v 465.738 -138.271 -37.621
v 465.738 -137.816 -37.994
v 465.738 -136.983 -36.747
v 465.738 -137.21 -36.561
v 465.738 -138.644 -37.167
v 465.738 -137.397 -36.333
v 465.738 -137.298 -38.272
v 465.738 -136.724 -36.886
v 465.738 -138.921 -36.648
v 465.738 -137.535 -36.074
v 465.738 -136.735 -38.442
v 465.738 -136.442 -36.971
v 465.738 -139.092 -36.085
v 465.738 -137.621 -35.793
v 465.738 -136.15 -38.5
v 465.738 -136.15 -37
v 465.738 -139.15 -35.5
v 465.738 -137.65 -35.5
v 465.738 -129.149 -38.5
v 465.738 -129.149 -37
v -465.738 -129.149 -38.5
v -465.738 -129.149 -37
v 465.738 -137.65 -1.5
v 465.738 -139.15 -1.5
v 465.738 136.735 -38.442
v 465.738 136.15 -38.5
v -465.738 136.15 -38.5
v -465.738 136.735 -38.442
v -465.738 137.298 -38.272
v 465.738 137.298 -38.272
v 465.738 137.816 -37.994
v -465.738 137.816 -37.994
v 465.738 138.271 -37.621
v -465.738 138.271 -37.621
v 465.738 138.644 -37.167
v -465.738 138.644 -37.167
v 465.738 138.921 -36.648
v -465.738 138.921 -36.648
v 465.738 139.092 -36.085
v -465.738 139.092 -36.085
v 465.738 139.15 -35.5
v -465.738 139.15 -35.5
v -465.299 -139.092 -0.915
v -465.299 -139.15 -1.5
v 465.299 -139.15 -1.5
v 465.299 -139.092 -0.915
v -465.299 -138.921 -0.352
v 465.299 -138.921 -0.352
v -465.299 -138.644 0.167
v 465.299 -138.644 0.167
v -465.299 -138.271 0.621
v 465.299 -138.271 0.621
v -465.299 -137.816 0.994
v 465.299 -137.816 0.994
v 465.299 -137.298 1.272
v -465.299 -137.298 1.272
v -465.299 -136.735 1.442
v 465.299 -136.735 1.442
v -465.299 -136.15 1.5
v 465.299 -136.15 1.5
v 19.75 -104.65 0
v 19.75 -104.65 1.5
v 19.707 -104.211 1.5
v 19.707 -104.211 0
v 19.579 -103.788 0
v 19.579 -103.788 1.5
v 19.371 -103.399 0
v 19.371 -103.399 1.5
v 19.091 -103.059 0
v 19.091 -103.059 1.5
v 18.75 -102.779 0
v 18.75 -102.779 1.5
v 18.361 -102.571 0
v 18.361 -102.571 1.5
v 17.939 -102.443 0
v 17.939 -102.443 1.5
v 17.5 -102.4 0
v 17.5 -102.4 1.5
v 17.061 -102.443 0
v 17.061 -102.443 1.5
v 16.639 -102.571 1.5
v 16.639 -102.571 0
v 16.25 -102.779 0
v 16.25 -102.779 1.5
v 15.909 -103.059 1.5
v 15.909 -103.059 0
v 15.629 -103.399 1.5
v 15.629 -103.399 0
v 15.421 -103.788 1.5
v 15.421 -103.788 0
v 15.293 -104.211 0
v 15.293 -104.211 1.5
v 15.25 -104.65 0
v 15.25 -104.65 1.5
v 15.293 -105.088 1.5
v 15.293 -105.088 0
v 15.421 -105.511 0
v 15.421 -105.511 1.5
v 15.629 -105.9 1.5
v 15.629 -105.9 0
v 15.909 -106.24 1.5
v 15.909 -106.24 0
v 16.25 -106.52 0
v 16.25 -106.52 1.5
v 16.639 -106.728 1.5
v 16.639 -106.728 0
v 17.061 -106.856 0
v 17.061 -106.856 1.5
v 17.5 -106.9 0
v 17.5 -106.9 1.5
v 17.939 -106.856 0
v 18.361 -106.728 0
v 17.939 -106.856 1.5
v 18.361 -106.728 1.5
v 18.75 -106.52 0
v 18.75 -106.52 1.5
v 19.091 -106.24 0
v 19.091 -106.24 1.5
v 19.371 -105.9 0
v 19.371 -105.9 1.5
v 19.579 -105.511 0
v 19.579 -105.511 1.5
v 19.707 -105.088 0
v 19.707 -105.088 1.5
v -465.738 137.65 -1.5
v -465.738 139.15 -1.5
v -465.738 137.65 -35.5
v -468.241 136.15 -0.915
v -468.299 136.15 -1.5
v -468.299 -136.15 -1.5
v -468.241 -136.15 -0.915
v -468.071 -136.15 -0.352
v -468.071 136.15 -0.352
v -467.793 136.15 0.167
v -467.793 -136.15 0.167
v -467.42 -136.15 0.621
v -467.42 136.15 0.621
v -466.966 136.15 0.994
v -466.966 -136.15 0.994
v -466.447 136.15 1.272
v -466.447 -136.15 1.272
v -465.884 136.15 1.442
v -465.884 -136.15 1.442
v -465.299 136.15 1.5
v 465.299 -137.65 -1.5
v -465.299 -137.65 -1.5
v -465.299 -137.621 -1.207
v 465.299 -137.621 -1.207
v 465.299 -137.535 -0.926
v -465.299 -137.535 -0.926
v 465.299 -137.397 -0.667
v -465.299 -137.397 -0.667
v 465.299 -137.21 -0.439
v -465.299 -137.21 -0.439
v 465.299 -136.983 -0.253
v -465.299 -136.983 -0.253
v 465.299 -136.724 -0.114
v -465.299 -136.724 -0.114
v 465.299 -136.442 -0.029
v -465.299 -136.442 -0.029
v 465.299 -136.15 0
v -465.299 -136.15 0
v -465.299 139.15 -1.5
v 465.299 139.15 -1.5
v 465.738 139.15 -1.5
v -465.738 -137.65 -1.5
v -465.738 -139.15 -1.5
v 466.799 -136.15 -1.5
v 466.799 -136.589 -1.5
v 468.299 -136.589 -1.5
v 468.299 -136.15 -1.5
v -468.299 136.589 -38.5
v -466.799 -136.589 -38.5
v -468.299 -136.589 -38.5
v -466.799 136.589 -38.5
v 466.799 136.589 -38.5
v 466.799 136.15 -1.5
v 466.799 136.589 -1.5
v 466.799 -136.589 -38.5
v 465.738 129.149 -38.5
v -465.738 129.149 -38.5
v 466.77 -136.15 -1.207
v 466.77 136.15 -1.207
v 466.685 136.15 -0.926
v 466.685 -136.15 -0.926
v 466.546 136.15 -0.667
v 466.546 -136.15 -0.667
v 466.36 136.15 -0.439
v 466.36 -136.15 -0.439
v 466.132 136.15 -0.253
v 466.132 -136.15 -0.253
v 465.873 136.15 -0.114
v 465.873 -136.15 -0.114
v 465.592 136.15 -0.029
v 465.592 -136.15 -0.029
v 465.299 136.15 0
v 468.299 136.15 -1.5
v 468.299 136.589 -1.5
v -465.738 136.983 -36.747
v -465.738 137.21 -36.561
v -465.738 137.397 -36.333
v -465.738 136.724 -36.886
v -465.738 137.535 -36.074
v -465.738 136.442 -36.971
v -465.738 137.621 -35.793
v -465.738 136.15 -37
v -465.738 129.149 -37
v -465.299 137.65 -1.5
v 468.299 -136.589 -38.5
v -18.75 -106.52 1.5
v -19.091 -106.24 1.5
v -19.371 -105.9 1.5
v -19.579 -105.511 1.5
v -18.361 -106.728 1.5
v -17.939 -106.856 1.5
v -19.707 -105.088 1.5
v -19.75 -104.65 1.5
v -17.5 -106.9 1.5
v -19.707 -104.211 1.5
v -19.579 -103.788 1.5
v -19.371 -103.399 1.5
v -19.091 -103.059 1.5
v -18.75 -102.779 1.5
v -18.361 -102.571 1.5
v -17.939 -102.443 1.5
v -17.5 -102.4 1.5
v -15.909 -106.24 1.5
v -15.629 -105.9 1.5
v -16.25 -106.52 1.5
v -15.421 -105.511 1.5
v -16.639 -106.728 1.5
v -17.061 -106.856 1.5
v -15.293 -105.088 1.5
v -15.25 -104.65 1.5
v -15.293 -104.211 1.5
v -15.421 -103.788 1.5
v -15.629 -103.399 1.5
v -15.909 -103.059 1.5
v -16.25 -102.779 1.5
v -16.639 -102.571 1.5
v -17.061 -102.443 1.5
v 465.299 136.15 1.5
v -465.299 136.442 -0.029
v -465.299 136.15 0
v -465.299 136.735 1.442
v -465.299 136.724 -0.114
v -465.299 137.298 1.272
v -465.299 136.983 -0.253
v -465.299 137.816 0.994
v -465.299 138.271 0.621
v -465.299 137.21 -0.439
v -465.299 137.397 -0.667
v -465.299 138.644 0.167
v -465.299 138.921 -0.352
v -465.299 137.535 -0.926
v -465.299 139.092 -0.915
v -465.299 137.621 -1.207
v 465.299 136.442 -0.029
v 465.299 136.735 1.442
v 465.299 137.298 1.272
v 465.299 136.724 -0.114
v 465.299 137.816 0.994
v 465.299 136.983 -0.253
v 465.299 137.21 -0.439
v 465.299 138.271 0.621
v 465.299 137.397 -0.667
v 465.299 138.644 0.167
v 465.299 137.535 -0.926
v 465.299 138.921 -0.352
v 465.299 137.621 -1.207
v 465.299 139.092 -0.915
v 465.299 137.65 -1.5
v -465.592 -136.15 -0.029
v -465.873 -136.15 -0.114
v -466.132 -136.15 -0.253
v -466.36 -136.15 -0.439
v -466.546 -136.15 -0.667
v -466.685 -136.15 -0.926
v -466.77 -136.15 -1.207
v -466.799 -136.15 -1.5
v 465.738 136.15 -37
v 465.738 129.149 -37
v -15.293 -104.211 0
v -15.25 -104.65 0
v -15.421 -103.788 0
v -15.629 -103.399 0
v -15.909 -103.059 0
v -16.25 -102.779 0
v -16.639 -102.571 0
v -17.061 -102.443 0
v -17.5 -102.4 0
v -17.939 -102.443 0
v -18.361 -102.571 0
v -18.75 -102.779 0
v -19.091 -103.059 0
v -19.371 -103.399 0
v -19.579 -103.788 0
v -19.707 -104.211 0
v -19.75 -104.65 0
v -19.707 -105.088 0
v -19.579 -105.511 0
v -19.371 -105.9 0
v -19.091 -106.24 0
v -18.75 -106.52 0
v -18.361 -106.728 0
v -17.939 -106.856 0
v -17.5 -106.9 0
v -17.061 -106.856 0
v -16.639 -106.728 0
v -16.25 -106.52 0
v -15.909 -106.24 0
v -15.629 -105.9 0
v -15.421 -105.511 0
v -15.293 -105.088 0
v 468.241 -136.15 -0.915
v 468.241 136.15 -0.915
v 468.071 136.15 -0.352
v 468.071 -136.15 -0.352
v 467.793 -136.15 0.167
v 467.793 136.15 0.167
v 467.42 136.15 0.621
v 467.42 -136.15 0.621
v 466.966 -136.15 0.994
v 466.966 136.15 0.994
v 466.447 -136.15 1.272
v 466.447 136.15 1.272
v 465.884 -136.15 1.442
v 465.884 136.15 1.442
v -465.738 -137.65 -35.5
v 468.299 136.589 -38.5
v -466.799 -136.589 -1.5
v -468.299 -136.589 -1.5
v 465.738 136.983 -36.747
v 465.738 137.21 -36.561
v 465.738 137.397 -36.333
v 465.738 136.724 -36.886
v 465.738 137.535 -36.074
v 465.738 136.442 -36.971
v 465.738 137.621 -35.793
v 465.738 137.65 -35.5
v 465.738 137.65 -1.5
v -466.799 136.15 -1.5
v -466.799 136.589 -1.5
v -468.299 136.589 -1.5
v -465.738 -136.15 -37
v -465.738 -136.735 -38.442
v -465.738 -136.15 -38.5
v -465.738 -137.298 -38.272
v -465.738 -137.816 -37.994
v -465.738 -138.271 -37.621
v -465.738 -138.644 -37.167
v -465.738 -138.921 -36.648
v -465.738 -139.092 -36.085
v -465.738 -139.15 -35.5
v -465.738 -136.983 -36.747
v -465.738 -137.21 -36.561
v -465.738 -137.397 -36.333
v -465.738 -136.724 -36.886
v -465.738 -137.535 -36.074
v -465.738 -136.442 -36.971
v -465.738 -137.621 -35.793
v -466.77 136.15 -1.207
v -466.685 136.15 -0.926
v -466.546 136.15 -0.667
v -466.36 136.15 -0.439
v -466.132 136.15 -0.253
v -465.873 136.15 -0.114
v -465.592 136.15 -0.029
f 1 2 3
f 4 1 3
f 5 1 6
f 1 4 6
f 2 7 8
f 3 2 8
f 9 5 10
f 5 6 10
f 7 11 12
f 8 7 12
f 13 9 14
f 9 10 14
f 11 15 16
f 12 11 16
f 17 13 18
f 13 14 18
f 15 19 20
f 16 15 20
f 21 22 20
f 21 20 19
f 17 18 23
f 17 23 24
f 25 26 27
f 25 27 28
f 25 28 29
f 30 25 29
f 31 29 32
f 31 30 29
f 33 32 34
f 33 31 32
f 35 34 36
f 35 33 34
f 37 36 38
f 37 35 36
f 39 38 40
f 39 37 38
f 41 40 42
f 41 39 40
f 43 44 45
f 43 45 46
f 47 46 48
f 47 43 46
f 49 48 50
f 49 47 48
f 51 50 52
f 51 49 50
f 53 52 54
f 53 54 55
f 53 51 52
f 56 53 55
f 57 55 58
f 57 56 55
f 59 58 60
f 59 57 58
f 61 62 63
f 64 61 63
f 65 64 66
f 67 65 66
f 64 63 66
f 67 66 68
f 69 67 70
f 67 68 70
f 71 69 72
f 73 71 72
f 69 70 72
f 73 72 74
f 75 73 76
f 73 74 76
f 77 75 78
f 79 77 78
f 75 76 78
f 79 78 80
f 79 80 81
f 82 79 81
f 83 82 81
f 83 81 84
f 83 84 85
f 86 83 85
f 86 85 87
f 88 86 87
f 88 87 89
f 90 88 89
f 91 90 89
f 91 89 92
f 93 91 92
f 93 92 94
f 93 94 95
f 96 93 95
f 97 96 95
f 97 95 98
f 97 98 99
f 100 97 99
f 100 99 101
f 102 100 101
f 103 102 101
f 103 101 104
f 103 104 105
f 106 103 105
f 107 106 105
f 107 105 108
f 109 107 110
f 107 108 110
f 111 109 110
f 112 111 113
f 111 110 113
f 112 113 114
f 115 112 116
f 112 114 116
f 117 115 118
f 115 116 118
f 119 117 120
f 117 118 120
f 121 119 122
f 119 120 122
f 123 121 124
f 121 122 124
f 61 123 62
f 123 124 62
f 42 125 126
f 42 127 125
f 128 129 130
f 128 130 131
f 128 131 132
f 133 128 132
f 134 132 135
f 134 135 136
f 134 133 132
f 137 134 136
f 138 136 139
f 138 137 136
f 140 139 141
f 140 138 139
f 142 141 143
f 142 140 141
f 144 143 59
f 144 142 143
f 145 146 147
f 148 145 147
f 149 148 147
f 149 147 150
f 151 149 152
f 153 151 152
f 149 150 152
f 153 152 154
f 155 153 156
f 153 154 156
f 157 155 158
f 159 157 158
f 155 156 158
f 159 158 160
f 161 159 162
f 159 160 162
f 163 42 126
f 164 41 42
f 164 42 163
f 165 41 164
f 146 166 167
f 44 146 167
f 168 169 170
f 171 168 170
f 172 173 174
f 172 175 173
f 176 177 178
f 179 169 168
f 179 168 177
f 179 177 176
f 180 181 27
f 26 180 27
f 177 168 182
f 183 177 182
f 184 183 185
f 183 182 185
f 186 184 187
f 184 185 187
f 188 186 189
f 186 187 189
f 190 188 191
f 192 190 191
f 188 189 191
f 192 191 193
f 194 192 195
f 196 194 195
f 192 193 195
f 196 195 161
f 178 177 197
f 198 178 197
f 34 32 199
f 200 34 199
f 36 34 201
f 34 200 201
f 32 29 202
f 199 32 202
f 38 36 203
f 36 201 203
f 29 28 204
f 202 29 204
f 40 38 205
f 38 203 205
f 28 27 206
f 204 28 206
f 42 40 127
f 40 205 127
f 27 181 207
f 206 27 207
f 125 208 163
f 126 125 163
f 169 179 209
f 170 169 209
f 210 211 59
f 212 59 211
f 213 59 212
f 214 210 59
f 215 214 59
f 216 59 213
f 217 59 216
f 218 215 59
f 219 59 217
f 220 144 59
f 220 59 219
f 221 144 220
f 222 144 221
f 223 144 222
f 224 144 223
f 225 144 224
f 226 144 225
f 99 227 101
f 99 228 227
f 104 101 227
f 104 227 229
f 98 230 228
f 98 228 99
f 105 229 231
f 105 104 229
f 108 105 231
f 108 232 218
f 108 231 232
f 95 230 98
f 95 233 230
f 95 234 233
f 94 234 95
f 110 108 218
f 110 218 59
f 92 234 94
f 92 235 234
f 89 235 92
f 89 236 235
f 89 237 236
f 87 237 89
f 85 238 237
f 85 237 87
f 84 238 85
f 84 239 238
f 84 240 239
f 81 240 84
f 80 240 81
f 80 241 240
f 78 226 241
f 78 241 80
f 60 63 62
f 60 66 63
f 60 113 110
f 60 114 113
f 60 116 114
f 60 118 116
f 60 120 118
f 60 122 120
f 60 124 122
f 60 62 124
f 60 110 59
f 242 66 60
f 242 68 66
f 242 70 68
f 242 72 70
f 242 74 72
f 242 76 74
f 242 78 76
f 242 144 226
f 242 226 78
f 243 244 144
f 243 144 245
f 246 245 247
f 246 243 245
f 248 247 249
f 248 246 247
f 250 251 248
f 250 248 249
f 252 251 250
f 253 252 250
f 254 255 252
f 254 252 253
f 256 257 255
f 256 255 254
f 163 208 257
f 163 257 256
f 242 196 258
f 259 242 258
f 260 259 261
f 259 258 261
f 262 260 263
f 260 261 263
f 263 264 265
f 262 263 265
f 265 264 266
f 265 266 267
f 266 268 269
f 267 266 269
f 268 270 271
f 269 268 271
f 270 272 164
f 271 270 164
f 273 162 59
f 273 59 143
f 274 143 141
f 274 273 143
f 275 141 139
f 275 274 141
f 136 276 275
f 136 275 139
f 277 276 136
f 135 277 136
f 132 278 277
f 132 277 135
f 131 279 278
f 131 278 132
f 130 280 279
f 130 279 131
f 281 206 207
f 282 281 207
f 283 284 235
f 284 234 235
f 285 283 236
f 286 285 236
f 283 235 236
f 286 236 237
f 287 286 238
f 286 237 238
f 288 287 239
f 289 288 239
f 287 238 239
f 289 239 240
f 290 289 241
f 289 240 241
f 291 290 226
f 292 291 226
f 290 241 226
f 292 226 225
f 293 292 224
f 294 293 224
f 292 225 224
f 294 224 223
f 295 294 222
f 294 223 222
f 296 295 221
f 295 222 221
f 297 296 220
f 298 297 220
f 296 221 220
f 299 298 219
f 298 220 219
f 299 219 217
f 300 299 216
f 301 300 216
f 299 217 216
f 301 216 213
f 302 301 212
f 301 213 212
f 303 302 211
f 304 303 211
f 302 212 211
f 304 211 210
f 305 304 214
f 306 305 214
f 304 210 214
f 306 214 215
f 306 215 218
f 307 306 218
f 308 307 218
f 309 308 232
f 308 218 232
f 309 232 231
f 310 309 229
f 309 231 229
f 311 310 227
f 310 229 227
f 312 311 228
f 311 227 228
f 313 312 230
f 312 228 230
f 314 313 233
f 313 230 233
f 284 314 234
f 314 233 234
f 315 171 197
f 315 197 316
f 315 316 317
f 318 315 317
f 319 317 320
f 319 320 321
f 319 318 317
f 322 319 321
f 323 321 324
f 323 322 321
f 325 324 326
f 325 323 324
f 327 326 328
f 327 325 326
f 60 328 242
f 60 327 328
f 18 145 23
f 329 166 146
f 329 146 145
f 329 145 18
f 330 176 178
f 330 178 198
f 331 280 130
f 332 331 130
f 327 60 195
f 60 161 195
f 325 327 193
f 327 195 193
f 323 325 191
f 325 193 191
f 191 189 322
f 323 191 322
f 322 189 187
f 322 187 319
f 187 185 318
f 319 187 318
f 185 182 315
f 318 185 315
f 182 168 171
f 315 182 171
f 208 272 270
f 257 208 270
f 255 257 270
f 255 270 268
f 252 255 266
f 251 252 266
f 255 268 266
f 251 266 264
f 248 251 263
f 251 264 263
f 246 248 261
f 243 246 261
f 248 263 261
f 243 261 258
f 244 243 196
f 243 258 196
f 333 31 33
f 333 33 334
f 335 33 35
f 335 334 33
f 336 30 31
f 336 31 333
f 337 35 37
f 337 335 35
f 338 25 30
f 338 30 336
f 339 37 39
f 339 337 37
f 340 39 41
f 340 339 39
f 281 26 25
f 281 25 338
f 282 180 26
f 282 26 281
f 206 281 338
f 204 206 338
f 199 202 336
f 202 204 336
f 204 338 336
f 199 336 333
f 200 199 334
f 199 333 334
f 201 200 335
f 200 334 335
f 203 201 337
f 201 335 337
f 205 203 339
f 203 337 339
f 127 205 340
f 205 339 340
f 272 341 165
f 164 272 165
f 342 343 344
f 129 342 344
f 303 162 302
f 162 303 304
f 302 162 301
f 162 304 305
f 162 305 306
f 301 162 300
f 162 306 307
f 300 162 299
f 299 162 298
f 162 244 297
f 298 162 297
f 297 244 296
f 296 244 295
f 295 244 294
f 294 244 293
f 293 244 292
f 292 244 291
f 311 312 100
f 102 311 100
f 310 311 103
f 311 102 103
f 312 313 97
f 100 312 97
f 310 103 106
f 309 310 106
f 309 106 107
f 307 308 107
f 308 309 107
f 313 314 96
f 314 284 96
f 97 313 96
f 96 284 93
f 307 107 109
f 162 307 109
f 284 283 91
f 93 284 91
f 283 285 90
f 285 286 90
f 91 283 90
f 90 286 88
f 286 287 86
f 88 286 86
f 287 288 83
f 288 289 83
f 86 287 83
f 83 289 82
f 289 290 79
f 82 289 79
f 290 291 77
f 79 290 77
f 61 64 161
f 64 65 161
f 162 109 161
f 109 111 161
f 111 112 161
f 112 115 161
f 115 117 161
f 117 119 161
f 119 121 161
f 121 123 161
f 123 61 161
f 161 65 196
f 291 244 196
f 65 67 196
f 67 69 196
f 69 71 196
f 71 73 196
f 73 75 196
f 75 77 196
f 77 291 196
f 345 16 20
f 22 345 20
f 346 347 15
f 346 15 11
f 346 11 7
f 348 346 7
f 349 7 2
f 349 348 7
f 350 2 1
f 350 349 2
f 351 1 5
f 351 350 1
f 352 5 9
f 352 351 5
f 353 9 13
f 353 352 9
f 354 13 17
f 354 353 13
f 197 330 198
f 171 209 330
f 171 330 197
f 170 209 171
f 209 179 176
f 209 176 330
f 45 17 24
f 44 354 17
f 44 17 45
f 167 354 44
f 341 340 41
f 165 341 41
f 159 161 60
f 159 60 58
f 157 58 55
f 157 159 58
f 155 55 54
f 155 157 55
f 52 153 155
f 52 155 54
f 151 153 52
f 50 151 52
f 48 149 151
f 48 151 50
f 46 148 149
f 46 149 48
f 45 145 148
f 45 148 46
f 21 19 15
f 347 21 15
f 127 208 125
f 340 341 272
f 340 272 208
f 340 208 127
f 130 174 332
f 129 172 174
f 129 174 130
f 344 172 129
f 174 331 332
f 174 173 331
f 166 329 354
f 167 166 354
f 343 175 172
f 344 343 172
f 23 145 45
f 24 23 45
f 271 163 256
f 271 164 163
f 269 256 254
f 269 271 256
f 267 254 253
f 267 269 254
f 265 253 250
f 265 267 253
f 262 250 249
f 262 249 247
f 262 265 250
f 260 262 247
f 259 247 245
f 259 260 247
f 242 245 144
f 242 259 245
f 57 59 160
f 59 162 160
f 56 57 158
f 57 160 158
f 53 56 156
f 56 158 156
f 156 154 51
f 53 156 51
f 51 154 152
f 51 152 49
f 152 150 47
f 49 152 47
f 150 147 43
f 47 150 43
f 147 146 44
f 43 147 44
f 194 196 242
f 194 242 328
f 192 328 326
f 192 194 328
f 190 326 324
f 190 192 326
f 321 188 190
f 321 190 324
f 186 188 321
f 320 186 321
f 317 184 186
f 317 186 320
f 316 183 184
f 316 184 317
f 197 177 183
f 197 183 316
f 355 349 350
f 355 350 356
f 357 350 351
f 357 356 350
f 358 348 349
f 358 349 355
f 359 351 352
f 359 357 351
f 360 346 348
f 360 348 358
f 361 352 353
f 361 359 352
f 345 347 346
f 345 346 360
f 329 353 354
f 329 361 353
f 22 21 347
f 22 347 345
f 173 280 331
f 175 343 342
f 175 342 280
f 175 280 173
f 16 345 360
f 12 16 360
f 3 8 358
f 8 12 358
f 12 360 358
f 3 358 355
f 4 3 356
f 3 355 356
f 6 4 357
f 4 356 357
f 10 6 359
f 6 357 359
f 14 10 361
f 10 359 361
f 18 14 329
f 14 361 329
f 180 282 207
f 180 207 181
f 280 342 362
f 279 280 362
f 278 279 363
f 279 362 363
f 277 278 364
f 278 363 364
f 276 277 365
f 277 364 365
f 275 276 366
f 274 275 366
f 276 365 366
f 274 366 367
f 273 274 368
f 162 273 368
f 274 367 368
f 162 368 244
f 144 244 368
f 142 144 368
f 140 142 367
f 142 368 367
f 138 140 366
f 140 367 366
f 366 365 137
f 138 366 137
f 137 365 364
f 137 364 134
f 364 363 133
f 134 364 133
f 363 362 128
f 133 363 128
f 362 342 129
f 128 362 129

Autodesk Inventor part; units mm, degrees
ref_plane "YZ Plane" through (0, 0, 0) normal (1, 0, 0) x (0, 1, 0)
ref_plane "XZ Plane" through (0, 0, 0) normal (0, 1, 0) x (-1, 0, 0)
ref_plane "XY Plane" through (0, 0, 0) normal (0, 0, 1) x (1, 0, 0)
sketch "Sketch1" plane through (0, 0, 0) normal (0, 0, 1) x (1, 0, 0)
  line L0 (468.299, -139.1495) -> (-468.299, -139.1495)
  line L1 (-468.299, -139.1495) -> (-468.299, 139.1495)
  line L2 (-468.299, 139.1495) -> (468.299, 139.1495)
  line L3 (468.299, 139.1495) -> (468.299, -139.1495)
  line L4 (468.299, -139.1495) -> (-468.299, 139.1495) construction
  line L5 (-468.299, -139.1495) -> (468.299, 139.1495) construction
  point P0 (0, 0)
  dimension "d0" = 936.598
  dimension "d1" = 278.299
extrude "Plate1" add sketch "Sketch1" along normal blind 1.5
sketch "Sketch2" plane through (-468.299, -137.6495, 1.5) normal (0, -1, 0) x (1, 0, 0)
  line L0 (936.598, 0) -> (0, 0)
  line L1 (0, 0) -> (0, -40)
  line L2 (0, -40) -> (936.598, -40)
  line L3 (936.598, -40) -> (936.598, 0)
edge flange "Flange1" height 40 angle 90 thickness 1.5 bend radius 1.5 thickness toward (0, -1, 0) relief tear relief width 1.5 relief depth 0.75 corner gap 1.5 corner form 2 edges at (0, -139.1495, 0) (-468.299, 0, 0) (0, 139.1495, 0) (468.299, 0, 0) wall of the first edge with corners at (468.299, -137.6495, 1.5) (-468.299, -137.6495, 1.5) (-468.299, -137.6495, -38.5) (468.299, -137.6495, -38.5)
bend "Bend1"
corner "Corner1"
sketch "Sketch3" plane through (-465.7383, -139.1495, -37) normal (0, 0, -1) x (-1, 0, 0)
  line L0 (-931.4767, 0) -> (0, 0)
  line L1 (0, 0) -> (0, 10)
  line L2 (0, 10) -> (-931.4767, 10)
  line L3 (-931.4767, 10) -> (-931.4767, 0)
edge flange "Flange2" height 10 angle 90 thickness 1.5 bend radius 1.5 thickness toward (0, 0, -1) relief tear relief width 1.5 relief depth 0.75 corner gap 1.5 corner form 0 edges at (0, -137.6495, -38.5) (0, 137.6495, -38.5) wall of the first edge with corners at (465.7383, -139.1495, -37) (-465.7383, -139.1495, -37) (-465.7383, -129.1495, -37) (465.7383, -129.1495, -37)
bend "Bend2"
corner "Corner2"
sketch "Sketch4" plane through (0, 0, 1.5) normal (0, 0, 1) x (1, 0, 0)
  circle A0 centre (17.5, -104.6495) radius 2.25 projected
  circle A1 centre (-17.5, -104.6495) radius 2.25 projected
  point P0 (0, 0)
extrude "Extrusion1" cut sketch "Sketch4" against normal through all
equation "\"d3\" = BendReliefWidth"
equation "\"d4\" = BendReliefDepth"
equation "\"d5\" = MinimumRemnant"
equation "\"d6\" = BendRadius"
equation "\"d9\" = BendRadius"
equation "\"d10\" = CornerReliefSize"
equation "\"d11\" = GapSize"
equation "\"d12\" = JacobiRadiusSize"
equation "\"d13\" = BendReliefWidth"
equation "\"d14\" = BendReliefDepth"
equation "\"d15\" = MinimumRemnant"
equation "\"d16\" = BendRadius"
equation "\"d19\" = BendRadius"
equation "\"d20\" = CornerReliefSize"
equation "\"d21\" = GapSize"
equation "\"d22\" = JacobiRadiusSize"
equation "\"BendRadius\" = Thickness"
equation "\"BendReliefWidth\" = Thickness"
equation "\"BendReliefDepth\" = 0.5 * Thickness"
equation "\"CornerReliefSize\" = 4 * Thickness"
equation "\"MinimumRemnant\" = 2 * Thickness"
equation "\"TransitionRadius\" = BendRadius"
equation "\"JacobiRadiusSize\" = BendRadius"
equation "\"GapSize\" = Thickness"
equation "\"d2\" = BendRadius"
equation "\"Thickness\" = 1.5"
properties part number "Base Gabinete" material "Stainless Steel"
